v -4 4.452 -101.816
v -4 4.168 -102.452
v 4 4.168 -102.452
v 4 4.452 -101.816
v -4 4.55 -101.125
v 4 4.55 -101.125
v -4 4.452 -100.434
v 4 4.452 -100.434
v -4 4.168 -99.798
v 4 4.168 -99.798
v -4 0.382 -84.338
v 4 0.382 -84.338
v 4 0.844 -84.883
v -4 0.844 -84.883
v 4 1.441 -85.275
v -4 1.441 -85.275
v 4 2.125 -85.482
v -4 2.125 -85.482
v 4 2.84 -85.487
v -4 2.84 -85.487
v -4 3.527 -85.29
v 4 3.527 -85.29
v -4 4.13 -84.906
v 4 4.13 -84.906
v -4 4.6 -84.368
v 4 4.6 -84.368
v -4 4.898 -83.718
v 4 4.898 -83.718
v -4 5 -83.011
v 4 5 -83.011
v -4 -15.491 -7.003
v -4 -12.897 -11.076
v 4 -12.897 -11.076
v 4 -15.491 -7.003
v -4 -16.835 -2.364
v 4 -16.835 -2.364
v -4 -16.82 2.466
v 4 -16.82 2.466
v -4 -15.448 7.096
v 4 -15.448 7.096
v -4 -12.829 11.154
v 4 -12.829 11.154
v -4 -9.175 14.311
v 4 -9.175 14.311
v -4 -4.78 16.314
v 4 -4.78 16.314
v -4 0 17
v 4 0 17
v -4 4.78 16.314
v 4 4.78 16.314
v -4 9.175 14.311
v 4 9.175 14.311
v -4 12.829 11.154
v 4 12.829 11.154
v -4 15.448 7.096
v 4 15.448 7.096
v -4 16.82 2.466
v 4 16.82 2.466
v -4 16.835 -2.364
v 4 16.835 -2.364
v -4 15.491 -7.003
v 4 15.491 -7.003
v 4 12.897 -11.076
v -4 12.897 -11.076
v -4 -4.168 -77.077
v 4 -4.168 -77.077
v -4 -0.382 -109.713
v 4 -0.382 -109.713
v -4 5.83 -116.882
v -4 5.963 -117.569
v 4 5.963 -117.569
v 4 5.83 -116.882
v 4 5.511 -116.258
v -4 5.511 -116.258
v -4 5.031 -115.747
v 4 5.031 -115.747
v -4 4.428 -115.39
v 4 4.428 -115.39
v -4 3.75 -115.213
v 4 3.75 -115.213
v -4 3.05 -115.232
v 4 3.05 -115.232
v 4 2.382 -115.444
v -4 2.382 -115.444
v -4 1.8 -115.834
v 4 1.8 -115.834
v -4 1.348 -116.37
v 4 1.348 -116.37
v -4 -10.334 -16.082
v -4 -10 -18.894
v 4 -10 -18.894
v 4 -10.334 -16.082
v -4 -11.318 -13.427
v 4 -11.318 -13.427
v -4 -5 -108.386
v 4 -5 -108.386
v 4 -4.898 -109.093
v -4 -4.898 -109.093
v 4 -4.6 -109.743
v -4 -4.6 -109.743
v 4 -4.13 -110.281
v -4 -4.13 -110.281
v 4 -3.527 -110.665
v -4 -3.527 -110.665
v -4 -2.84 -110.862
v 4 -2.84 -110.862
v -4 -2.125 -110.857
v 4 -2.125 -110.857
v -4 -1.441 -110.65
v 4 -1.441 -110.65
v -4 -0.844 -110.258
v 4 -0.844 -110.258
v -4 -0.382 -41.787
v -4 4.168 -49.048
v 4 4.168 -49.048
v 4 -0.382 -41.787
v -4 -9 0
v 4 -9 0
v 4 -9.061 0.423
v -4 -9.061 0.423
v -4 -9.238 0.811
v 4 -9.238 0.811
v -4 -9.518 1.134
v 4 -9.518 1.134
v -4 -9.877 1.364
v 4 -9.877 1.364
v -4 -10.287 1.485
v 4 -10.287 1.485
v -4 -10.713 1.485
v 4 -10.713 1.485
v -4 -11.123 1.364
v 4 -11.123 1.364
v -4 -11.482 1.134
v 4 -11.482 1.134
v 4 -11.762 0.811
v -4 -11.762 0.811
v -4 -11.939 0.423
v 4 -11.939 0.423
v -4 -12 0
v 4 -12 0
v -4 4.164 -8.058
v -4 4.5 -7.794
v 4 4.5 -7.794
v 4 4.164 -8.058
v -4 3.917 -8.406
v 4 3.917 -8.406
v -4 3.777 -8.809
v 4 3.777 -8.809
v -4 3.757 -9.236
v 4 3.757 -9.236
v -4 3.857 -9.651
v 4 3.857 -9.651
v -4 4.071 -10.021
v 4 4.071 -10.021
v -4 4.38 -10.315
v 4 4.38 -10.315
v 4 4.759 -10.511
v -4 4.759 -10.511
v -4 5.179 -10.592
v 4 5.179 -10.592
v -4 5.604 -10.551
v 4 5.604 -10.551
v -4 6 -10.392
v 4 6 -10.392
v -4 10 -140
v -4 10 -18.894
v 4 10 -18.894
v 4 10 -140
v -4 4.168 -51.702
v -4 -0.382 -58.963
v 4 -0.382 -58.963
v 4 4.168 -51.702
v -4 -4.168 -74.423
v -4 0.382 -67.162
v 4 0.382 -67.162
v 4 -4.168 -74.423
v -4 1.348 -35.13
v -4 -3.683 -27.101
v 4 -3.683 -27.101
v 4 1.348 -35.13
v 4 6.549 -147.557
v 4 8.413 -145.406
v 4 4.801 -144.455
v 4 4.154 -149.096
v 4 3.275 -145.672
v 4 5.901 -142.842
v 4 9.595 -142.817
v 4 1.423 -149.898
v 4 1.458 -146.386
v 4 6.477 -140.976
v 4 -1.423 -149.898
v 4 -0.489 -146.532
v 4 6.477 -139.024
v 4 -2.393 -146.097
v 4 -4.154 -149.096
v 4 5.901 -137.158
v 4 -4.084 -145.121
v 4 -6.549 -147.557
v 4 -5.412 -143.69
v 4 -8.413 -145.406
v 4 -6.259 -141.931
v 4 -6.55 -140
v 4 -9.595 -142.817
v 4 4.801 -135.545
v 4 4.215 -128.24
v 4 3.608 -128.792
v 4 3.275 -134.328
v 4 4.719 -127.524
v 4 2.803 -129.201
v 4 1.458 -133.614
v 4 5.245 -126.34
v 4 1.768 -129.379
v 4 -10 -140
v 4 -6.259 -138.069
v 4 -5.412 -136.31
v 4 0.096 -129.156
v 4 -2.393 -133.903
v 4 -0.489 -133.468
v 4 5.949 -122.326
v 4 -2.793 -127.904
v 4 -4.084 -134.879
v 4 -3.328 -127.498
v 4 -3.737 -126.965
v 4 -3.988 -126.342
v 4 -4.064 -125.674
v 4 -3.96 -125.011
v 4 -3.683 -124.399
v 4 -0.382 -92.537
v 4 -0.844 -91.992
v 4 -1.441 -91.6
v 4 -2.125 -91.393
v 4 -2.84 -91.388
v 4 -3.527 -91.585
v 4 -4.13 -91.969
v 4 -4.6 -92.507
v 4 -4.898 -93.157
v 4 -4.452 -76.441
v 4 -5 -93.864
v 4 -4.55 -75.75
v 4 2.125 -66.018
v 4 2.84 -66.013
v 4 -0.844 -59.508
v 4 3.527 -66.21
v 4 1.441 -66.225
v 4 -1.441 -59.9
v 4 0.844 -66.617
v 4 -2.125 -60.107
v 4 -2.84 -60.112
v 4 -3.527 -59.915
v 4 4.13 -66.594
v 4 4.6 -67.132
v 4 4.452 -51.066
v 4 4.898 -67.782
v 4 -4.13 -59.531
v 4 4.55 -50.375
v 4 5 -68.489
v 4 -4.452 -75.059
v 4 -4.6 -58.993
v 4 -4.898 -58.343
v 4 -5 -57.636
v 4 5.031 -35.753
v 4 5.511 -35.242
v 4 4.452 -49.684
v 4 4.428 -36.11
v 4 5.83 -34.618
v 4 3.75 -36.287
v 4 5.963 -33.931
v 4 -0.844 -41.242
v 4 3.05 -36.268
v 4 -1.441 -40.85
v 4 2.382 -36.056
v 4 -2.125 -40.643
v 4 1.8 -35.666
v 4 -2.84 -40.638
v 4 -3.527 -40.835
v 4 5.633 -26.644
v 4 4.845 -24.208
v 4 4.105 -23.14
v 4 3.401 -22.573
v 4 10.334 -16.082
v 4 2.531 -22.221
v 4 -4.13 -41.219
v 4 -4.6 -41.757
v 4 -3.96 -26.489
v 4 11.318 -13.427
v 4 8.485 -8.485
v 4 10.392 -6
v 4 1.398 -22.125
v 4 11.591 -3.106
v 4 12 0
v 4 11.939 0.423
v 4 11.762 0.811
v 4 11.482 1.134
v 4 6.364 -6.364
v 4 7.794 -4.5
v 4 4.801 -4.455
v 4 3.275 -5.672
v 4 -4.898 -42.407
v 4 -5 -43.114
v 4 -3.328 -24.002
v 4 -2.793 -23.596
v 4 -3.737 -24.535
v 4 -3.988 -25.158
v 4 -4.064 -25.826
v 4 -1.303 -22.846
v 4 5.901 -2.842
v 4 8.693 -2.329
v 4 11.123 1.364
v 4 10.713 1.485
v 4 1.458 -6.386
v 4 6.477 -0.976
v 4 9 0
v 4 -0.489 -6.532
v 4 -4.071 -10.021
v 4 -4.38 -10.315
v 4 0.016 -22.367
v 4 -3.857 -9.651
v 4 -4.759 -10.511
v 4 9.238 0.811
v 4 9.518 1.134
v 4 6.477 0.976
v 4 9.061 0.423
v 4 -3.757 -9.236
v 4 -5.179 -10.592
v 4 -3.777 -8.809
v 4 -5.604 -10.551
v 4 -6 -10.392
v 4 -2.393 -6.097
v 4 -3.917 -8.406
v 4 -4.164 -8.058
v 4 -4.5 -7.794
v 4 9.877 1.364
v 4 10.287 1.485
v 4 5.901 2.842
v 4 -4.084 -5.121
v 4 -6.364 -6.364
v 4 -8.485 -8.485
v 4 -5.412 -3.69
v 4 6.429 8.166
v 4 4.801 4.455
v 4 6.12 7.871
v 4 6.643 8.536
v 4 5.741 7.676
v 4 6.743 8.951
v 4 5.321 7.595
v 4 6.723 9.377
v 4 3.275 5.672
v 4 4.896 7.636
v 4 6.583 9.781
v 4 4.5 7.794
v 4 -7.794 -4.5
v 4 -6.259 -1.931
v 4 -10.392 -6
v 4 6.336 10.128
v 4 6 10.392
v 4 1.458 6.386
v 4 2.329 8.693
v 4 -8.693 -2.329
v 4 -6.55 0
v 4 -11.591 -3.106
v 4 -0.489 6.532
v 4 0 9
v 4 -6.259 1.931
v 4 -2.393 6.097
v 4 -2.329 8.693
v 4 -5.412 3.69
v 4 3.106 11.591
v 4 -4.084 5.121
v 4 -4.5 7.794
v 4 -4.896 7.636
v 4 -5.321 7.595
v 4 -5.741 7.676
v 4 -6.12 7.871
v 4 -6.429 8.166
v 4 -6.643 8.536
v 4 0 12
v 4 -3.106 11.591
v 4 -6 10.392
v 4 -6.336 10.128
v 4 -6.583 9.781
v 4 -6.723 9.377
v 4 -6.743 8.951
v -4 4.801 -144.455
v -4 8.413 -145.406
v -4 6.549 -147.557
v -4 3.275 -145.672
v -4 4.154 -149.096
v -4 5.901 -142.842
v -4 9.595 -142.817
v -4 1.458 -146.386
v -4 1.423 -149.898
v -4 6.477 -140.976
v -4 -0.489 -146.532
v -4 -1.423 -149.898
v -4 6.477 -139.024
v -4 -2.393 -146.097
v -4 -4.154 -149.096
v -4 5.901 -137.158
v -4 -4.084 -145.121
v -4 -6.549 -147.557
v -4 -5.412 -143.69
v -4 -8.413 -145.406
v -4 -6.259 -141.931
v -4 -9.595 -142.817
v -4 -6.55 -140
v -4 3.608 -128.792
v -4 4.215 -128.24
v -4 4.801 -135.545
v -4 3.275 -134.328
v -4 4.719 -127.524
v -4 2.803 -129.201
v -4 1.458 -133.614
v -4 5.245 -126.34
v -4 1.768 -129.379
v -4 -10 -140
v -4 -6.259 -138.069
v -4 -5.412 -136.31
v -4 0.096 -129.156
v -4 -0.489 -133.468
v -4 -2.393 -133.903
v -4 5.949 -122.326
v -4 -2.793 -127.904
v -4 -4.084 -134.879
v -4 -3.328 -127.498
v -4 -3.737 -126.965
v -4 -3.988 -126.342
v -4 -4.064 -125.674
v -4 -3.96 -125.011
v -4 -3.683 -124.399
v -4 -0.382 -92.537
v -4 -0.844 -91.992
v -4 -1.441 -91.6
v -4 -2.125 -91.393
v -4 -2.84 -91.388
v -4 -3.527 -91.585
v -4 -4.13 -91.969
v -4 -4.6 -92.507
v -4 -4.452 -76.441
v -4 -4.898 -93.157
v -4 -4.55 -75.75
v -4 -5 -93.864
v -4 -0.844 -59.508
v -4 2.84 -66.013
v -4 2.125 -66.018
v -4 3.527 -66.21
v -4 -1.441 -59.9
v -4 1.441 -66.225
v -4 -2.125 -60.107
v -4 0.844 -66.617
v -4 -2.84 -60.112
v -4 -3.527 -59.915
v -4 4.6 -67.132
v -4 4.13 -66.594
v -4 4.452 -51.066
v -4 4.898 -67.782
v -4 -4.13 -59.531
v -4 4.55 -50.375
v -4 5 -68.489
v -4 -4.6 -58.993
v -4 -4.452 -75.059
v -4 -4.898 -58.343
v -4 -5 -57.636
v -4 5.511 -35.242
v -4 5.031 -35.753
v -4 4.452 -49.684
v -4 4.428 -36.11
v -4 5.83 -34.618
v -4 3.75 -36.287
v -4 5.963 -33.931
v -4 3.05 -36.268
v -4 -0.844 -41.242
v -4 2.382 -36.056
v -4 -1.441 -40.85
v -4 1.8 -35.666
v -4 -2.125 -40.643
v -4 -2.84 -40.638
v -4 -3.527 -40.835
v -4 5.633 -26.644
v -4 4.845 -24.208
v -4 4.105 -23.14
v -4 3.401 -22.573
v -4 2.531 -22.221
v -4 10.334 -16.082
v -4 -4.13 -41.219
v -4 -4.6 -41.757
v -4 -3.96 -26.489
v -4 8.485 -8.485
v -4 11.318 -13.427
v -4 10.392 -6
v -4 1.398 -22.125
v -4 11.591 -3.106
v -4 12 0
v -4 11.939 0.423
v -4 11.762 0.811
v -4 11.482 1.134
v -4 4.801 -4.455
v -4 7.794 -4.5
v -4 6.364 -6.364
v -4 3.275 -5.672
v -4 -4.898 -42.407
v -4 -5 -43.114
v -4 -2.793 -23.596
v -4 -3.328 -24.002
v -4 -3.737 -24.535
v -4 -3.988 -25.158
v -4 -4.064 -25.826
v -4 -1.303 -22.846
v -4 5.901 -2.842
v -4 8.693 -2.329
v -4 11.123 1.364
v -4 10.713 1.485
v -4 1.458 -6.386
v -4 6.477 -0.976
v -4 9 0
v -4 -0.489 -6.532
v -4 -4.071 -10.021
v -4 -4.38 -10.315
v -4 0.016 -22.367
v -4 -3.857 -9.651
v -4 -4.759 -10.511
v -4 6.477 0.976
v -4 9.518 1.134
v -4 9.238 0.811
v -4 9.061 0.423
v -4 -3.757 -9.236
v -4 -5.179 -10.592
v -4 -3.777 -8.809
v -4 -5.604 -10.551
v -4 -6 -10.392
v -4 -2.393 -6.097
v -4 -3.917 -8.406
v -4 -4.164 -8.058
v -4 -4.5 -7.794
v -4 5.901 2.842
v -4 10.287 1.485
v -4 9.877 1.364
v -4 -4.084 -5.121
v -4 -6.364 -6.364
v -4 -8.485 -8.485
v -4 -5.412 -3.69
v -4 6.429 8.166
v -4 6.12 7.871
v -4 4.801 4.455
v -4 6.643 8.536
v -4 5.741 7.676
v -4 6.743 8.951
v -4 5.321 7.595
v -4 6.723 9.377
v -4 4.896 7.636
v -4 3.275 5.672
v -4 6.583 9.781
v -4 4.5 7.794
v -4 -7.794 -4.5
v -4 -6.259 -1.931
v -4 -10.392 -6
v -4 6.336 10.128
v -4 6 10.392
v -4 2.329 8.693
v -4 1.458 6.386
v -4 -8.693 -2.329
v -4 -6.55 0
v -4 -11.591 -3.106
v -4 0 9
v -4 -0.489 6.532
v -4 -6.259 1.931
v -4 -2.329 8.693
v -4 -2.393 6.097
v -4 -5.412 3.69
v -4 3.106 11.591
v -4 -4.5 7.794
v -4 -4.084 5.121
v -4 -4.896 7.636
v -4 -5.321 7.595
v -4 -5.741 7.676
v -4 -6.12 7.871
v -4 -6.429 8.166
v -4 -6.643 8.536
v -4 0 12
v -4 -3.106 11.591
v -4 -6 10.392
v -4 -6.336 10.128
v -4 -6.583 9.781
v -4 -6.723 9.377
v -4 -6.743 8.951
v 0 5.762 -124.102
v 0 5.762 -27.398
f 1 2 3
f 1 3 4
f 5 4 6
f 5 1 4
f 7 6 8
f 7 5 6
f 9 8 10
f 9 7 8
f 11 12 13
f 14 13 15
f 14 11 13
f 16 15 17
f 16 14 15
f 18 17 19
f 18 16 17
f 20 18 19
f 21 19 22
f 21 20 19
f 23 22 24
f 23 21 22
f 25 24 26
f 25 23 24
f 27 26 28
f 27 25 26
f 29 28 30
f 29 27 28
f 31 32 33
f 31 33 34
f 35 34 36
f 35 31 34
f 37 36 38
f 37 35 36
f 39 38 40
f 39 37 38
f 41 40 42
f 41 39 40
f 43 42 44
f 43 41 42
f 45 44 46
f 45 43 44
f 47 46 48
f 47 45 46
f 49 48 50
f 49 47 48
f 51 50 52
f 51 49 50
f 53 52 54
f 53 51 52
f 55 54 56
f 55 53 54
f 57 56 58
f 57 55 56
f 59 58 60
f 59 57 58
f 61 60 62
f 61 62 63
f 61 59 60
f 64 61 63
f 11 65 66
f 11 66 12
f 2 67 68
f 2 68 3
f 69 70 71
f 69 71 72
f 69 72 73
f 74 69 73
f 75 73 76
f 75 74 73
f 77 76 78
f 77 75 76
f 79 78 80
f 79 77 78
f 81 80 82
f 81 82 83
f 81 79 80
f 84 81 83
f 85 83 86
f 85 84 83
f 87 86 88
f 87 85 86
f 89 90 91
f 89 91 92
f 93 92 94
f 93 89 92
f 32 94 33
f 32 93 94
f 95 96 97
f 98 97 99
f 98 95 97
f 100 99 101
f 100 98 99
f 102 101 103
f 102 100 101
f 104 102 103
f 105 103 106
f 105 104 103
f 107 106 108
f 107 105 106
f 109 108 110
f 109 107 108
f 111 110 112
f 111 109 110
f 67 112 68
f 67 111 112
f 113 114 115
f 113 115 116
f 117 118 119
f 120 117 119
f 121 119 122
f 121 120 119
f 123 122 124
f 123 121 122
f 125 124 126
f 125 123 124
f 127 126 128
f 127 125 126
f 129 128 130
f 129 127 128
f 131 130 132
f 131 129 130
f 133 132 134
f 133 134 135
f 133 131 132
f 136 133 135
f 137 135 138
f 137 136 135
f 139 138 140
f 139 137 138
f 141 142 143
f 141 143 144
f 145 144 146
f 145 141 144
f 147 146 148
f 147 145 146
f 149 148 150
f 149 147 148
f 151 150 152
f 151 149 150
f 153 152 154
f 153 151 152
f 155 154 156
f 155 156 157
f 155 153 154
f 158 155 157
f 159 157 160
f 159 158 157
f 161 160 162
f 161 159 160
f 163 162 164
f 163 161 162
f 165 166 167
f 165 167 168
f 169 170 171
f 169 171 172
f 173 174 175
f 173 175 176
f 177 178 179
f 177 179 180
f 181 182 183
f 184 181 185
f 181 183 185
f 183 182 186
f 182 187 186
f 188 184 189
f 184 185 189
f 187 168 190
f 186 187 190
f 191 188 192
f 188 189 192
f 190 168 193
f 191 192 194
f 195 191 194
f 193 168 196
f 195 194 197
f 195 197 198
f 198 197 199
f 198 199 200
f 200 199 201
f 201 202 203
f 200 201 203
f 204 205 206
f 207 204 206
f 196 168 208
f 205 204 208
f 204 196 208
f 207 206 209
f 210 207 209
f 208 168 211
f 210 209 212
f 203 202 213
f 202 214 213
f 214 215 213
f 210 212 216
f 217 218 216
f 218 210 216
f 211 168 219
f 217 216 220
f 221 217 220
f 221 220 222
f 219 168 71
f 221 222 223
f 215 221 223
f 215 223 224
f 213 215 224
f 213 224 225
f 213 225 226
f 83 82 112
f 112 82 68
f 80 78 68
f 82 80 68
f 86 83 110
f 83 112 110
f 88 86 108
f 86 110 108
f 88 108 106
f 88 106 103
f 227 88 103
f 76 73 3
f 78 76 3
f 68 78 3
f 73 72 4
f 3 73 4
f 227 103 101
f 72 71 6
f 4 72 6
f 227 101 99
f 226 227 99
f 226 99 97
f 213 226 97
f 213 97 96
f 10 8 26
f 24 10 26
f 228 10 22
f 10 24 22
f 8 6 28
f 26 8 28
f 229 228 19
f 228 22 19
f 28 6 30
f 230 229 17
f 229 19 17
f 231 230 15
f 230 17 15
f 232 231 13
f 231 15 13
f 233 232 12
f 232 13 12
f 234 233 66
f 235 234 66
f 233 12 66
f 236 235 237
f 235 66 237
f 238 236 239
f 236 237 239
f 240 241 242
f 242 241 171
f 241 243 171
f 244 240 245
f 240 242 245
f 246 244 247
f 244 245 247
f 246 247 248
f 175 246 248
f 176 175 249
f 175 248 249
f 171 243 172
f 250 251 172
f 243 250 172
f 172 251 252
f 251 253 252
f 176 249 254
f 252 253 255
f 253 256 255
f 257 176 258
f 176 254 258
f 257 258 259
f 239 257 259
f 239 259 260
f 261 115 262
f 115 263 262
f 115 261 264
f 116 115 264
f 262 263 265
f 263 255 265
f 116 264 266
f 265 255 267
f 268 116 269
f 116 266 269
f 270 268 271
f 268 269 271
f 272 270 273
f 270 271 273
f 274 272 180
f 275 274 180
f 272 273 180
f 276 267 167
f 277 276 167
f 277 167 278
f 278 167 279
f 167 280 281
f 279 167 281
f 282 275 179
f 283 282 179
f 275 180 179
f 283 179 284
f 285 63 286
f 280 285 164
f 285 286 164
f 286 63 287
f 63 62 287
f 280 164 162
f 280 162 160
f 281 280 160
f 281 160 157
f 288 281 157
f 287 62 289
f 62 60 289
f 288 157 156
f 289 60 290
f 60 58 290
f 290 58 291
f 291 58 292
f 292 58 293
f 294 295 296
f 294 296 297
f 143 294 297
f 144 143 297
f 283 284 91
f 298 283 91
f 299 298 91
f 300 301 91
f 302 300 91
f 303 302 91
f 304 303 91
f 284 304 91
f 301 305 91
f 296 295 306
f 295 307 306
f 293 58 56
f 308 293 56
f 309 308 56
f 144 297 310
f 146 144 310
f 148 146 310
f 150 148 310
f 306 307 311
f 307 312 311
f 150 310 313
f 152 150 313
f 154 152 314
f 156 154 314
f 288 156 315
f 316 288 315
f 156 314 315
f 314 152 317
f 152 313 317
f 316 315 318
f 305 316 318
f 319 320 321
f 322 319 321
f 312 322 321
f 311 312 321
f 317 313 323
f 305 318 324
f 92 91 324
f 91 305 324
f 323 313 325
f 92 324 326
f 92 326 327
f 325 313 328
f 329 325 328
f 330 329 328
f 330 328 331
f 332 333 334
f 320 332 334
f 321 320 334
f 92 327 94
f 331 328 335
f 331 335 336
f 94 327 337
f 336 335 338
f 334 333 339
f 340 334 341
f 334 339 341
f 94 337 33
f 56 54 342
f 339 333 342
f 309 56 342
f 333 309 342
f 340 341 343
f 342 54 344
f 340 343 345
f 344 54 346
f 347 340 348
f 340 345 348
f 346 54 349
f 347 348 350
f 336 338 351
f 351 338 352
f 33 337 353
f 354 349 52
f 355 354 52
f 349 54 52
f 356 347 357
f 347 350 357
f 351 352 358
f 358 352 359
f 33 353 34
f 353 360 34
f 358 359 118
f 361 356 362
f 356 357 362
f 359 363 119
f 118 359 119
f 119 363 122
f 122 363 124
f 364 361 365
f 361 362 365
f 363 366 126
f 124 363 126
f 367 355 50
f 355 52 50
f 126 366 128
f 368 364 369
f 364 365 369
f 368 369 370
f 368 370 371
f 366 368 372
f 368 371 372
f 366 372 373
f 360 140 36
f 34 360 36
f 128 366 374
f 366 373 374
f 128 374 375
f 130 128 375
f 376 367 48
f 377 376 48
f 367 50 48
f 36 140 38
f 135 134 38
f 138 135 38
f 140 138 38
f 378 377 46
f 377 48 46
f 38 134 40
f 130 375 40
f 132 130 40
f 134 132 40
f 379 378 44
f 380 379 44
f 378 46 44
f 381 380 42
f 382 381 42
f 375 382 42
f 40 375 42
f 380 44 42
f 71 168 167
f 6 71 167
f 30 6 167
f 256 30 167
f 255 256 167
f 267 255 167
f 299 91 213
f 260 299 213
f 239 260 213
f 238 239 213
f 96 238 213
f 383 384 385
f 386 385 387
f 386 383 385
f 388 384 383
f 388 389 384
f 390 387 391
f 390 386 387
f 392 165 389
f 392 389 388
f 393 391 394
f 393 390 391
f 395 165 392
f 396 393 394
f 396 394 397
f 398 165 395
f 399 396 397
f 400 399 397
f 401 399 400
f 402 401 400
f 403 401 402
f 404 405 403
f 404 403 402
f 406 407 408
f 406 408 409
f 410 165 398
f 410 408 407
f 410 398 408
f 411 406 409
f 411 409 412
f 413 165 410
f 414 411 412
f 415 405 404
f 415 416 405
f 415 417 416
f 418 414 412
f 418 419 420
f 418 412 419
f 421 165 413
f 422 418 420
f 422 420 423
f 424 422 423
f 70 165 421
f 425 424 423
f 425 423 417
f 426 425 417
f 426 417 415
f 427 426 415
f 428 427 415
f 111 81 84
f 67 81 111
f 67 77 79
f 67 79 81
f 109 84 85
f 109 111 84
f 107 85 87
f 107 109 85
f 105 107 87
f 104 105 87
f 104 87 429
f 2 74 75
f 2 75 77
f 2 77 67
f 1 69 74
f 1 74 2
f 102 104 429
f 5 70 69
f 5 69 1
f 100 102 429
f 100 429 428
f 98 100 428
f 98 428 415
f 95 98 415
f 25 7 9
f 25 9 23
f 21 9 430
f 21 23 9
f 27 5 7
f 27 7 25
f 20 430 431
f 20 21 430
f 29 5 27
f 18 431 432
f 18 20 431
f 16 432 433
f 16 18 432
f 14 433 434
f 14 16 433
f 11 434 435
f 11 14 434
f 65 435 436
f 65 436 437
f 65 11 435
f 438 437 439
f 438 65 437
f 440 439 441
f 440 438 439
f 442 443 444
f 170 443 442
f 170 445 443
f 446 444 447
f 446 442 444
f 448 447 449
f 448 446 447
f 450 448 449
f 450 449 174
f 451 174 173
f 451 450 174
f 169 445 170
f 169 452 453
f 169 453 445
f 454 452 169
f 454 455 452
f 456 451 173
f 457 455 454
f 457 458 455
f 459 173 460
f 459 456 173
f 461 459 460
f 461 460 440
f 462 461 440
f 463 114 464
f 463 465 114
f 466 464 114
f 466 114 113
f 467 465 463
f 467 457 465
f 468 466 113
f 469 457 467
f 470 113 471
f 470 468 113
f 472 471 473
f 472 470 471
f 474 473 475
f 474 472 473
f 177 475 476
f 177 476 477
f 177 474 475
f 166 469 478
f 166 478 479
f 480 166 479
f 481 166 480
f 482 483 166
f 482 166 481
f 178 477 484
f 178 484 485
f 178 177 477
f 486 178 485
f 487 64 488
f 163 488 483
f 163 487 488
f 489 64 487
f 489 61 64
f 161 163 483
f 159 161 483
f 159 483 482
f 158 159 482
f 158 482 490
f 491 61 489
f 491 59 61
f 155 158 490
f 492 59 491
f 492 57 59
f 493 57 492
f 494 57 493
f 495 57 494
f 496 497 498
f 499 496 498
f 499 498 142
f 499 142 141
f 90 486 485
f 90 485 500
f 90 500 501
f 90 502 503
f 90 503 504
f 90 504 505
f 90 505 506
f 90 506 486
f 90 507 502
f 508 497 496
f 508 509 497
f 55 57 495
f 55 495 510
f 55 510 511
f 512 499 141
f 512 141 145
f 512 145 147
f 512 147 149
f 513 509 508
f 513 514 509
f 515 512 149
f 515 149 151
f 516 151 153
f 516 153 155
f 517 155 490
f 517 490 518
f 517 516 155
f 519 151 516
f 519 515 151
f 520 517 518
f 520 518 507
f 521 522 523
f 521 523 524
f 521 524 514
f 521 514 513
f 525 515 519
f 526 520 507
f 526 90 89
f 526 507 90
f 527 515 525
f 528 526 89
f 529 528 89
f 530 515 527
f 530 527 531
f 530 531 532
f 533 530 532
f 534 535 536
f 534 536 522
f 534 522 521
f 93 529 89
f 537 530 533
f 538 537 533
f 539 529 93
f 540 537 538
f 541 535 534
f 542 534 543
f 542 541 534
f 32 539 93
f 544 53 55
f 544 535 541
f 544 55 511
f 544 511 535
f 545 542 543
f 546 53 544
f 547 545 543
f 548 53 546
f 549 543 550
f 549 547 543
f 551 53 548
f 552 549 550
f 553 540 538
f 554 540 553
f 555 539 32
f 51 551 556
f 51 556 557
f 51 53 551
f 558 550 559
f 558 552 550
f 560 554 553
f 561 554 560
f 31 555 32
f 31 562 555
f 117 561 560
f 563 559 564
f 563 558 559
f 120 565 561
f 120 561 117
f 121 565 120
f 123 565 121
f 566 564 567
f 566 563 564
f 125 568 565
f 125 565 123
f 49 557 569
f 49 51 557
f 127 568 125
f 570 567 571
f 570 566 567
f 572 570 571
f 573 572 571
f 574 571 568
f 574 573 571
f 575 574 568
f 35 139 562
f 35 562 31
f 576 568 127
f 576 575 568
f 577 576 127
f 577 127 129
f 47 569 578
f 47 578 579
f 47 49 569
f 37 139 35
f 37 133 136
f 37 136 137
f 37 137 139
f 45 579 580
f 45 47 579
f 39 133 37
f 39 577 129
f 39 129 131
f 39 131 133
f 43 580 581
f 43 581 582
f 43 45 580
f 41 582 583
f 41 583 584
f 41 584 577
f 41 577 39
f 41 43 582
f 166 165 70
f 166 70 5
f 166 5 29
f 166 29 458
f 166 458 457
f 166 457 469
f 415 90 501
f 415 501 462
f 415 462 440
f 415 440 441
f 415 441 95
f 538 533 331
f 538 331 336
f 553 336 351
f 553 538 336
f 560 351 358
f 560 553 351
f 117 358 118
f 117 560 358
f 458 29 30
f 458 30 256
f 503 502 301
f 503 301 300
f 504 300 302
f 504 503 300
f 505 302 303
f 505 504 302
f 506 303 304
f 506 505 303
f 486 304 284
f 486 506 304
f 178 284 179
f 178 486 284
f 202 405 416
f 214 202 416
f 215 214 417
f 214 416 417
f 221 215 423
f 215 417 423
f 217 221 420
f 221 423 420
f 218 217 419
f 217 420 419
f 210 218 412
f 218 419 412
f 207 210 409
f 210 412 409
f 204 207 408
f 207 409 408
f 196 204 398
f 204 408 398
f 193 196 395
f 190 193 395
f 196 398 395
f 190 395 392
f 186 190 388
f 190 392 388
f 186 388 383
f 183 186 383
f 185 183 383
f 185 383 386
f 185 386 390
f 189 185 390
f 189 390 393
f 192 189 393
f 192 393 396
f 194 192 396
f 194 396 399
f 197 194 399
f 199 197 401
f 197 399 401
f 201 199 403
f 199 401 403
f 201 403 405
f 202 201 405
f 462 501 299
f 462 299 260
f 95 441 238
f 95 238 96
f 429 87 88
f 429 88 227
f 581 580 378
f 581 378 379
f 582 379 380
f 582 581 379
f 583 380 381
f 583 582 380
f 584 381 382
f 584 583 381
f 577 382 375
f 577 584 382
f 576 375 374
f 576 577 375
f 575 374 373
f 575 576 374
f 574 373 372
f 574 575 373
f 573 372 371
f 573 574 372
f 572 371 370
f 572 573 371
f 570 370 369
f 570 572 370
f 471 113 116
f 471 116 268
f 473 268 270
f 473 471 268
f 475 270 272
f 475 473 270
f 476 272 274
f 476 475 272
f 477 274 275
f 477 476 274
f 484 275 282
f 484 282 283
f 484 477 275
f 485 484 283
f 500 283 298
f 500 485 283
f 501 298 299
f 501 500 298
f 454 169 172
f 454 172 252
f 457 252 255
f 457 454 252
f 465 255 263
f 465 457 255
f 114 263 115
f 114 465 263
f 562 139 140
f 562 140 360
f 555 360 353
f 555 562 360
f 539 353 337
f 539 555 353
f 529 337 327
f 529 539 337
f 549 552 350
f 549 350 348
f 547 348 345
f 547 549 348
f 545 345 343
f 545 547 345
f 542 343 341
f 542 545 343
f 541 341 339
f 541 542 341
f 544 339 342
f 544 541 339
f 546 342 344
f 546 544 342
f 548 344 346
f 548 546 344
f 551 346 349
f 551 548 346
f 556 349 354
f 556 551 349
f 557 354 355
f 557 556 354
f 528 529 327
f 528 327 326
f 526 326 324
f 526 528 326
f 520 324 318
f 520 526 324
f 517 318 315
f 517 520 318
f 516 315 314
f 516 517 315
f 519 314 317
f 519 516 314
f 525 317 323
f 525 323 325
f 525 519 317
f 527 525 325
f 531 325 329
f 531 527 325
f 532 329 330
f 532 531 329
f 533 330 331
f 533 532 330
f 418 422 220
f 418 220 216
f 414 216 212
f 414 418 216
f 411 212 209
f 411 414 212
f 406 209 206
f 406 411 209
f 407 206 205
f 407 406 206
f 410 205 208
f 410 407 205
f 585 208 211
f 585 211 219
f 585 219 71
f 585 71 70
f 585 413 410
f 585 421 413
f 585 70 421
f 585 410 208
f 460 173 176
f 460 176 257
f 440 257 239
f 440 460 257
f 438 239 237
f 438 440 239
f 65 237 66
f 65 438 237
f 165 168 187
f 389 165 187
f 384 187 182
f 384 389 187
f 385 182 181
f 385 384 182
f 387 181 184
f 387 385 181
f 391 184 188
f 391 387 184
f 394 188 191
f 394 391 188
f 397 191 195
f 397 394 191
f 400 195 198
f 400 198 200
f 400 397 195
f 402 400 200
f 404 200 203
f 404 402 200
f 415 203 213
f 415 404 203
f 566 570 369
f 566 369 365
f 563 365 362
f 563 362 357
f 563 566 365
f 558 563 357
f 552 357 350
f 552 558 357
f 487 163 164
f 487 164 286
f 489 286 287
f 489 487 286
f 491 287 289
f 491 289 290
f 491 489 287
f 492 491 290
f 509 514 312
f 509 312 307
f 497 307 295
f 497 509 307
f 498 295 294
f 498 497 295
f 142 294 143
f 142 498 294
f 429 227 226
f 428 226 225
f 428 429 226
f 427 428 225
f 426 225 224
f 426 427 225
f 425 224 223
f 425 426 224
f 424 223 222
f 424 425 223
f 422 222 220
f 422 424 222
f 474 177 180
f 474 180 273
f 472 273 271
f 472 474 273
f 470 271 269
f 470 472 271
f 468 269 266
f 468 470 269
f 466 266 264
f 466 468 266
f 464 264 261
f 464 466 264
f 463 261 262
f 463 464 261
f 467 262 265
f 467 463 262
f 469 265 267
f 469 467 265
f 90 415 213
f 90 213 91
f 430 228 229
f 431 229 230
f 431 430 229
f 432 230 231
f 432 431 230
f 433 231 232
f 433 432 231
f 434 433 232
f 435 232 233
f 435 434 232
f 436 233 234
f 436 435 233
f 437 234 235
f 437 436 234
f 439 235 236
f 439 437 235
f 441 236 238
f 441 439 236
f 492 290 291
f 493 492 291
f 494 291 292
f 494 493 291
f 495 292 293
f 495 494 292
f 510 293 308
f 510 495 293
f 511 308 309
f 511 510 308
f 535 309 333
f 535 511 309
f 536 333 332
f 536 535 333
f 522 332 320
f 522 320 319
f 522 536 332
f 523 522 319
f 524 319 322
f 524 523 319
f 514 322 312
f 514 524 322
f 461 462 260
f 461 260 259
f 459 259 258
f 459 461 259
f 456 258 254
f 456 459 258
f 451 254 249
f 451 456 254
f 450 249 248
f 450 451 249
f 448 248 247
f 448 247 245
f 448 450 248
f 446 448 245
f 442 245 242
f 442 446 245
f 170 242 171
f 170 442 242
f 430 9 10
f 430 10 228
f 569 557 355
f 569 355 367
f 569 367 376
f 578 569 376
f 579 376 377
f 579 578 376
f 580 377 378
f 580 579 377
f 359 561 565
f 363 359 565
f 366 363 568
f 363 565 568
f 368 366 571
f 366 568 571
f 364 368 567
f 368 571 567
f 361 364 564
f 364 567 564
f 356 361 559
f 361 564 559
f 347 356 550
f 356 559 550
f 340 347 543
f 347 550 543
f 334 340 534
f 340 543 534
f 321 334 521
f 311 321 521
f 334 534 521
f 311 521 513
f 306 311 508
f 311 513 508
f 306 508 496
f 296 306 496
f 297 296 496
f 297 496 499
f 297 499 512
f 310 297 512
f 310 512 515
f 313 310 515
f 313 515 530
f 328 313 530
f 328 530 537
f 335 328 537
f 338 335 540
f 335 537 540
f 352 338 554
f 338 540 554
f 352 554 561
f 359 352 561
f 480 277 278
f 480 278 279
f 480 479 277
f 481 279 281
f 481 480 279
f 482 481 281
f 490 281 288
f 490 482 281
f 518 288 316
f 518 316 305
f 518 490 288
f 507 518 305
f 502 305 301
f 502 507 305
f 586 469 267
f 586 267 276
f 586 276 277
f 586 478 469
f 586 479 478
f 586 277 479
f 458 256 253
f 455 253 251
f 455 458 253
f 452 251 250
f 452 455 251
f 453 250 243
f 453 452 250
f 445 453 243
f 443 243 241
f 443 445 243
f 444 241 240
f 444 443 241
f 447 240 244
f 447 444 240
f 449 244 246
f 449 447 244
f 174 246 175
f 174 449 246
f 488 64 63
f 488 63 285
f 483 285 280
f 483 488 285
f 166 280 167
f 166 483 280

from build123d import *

# Parameters (mm, degrees)
SKETCH_1_R      = 6.55
EXTRUDE_1_DEPTH = 8


with BuildPart() as part:
    # 草图1 → 凸台-拉伸1 (new body)
    with BuildSketch(Plane(origin=(-4, 0, 0), x_dir=(0, -1, 0), z_dir=(-1, 0, 0))):
        with BuildLine():
            Line((-10, -18.894443628), (-10, -140))
            ThreePointArc((-10, -140), (0, -150), (10, -140))
            Line((10, -140), (10, -18.894443628))
            ThreePointArc((10, -18.894443628), (10.74741409, -14.725593625), (12.896551724, -11.076053161))
            ThreePointArc((12.896551724, -11.076053161), (0, 17), (-12.896551724, -11.076053161))
            ThreePointArc((-12.896551724, -11.076053161), (-10.74741409, -14.725593625), (-10, -18.894443628))
        make_face()
        with Locations((0, -140)):
            Circle(SKETCH_1_R, mode=Mode.SUBTRACT)
        Circle(SKETCH_1_R, mode=Mode.SUBTRACT)
        with BuildLine():
            Line((-4.168179012, -99.797532142), (0.381550311, -92.536811957))
            ThreePointArc((0.381550311, -92.536811957), (3.190606899, -91.461560083), (5, -93.864279815))
            Line((5, -93.864279815), (5, -108.385720185))
            ThreePointArc((5, -108.385720185), (3.190606899, -110.788439917), (0.381550311, -109.713188043))
            Line((0.381550311, -109.713188043), (-4.168179012, -102.452467858))
            ThreePointArc((-4.168179012, -102.452467858), (-4.549729323, -101.125), (-4.168179012, -99.797532142))
        make_face(mode=Mode.SUBTRACT)
        with BuildLine():
            Line((-1.347932676, -116.369603301), (3.683273316, -124.398691695))
            ThreePointArc((3.683273316, -124.398691695), (3.98786354, -126.341689874), (2.792876182, -127.903746961))
            add(Edge.make_bspline(
                [(2.792876182, -127.903746961), (-2.877603269, -131.101619406), (-5.985402229, -127.808170374), (-6.076762251, -119.793304589), (-5.963124704, -117.569487096)],
                knots=[0.005408839, 0.005408839, 0.005408839, 0.005408839, 0.693539789, 0.980498212, 0.980498212, 0.980498212, 0.980498212], degree=3))
            ThreePointArc((-5.963124704, -117.569487096), (-4.09543452, -115.277506448), (-1.347932676, -116.369603301))
        make_face(mode=Mode.SUBTRACT)
        with BuildLine():
            Line((0.381550311, -58.963188043), (-4.168179012, -51.702467858))
            ThreePointArc((-4.168179012, -51.702467858), (-4.549729323, -50.375), (-4.168179012, -49.047532142))
            Line((-4.168179012, -49.047532142), (0.381550311, -41.786811957))
            ThreePointArc((0.381550311, -41.786811957), (3.190606899, -40.711560083), (5, -43.114279815))
            Line((5, -43.114279815), (5, -57.635720185))
            ThreePointArc((5, -57.635720185), (3.190606899, -60.038439917), (0.381550311, -58.963188043))
        make_face(mode=Mode.SUBTRACT)
        with BuildLine():
            Line((3.683273317, -27.101308304), (-1.347932676, -35.130396699))
            ThreePointArc((-1.347932676, -35.130396699), (-4.095434519, -36.222493552), (-5.963124704, -33.930512906))
            add(Edge.make_bspline(
                [(-5.963124704, -33.930512906), (-6.076762251, -31.706695412), (-5.98540223, -23.691829624), (-2.877603269, -20.398380591), (2.792876182, -23.596253037)],
                knots=[0.005408839, 0.005408839, 0.005408839, 0.005408839, 0.292367263, 0.980498213, 0.980498213, 0.980498213, 0.980498213], degree=3))
            ThreePointArc((2.792876182, -23.596253037), (3.987863541, -25.158310124), (3.683273317, -27.101308304))
        make_face(mode=Mode.SUBTRACT)
        with BuildLine():
            Line((4.168179012, -77.077467858), (-0.381550311, -84.338188043))
            ThreePointArc((-0.381550311, -84.338188043), (-3.190606899, -85.413439917), (-5, -83.010720185))
            Line((-5, -83.010720185), (-5, -68.489279815))
            ThreePointArc((-5, -68.489279815), (-3.190606899, -66.086560083), (-0.381550311, -67.161811957))
            Line((-0.381550311, -67.161811957), (4.168179012, -74.422532142))
            ThreePointArc((4.168179012, -74.422532142), (4.549729323, -75.75), (4.168179012, -77.077467858))
        make_face(mode=Mode.SUBTRACT)
        with BuildLine():
            ThreePointArc((-4.5, 7.794228634), (-6.549038106, 8.34326674), (-6, 10.392304845))
            ThreePointArc((-6, 10.392304845), (0, 12), (6, 10.392304845))
            ThreePointArc((6, 10.392304845), (6.549038106, 8.34326674), (4.5, 7.794228634))
            ThreePointArc((4.5, 7.794228634), (0, 9), (-4.5, 7.794228634))
        make_face(mode=Mode.SUBTRACT)
        with BuildLine():
            ThreePointArc((9, 0), (10.5, 1.5), (12, 0))
            ThreePointArc((12, 0), (10.392304845, -6), (6, -10.392304845))
            ThreePointArc((6, -10.392304845), (3.950961894, -9.84326674), (4.5, -7.794228634))
            ThreePointArc((4.5, -7.794228634), (7.794228634, -4.5), (9, 0))
        make_face(mode=Mode.SUBTRACT)
        with BuildLine():
            ThreePointArc((-4.5, -7.794228634), (-3.950961894, -9.84326674), (-6, -10.392304845))
            ThreePointArc((-6, -10.392304845), (-10.392304845, -6), (-12, 0))
            ThreePointArc((-12, 0), (-10.5, 1.5), (-9, 0))
            ThreePointArc((-9, 0), (-7.794228634, -4.5), (-4.5, -7.794228634))
        make_face(mode=Mode.SUBTRACT)
    extrude(amount=-EXTRUDE_1_DEPTH)


solid = part.part
